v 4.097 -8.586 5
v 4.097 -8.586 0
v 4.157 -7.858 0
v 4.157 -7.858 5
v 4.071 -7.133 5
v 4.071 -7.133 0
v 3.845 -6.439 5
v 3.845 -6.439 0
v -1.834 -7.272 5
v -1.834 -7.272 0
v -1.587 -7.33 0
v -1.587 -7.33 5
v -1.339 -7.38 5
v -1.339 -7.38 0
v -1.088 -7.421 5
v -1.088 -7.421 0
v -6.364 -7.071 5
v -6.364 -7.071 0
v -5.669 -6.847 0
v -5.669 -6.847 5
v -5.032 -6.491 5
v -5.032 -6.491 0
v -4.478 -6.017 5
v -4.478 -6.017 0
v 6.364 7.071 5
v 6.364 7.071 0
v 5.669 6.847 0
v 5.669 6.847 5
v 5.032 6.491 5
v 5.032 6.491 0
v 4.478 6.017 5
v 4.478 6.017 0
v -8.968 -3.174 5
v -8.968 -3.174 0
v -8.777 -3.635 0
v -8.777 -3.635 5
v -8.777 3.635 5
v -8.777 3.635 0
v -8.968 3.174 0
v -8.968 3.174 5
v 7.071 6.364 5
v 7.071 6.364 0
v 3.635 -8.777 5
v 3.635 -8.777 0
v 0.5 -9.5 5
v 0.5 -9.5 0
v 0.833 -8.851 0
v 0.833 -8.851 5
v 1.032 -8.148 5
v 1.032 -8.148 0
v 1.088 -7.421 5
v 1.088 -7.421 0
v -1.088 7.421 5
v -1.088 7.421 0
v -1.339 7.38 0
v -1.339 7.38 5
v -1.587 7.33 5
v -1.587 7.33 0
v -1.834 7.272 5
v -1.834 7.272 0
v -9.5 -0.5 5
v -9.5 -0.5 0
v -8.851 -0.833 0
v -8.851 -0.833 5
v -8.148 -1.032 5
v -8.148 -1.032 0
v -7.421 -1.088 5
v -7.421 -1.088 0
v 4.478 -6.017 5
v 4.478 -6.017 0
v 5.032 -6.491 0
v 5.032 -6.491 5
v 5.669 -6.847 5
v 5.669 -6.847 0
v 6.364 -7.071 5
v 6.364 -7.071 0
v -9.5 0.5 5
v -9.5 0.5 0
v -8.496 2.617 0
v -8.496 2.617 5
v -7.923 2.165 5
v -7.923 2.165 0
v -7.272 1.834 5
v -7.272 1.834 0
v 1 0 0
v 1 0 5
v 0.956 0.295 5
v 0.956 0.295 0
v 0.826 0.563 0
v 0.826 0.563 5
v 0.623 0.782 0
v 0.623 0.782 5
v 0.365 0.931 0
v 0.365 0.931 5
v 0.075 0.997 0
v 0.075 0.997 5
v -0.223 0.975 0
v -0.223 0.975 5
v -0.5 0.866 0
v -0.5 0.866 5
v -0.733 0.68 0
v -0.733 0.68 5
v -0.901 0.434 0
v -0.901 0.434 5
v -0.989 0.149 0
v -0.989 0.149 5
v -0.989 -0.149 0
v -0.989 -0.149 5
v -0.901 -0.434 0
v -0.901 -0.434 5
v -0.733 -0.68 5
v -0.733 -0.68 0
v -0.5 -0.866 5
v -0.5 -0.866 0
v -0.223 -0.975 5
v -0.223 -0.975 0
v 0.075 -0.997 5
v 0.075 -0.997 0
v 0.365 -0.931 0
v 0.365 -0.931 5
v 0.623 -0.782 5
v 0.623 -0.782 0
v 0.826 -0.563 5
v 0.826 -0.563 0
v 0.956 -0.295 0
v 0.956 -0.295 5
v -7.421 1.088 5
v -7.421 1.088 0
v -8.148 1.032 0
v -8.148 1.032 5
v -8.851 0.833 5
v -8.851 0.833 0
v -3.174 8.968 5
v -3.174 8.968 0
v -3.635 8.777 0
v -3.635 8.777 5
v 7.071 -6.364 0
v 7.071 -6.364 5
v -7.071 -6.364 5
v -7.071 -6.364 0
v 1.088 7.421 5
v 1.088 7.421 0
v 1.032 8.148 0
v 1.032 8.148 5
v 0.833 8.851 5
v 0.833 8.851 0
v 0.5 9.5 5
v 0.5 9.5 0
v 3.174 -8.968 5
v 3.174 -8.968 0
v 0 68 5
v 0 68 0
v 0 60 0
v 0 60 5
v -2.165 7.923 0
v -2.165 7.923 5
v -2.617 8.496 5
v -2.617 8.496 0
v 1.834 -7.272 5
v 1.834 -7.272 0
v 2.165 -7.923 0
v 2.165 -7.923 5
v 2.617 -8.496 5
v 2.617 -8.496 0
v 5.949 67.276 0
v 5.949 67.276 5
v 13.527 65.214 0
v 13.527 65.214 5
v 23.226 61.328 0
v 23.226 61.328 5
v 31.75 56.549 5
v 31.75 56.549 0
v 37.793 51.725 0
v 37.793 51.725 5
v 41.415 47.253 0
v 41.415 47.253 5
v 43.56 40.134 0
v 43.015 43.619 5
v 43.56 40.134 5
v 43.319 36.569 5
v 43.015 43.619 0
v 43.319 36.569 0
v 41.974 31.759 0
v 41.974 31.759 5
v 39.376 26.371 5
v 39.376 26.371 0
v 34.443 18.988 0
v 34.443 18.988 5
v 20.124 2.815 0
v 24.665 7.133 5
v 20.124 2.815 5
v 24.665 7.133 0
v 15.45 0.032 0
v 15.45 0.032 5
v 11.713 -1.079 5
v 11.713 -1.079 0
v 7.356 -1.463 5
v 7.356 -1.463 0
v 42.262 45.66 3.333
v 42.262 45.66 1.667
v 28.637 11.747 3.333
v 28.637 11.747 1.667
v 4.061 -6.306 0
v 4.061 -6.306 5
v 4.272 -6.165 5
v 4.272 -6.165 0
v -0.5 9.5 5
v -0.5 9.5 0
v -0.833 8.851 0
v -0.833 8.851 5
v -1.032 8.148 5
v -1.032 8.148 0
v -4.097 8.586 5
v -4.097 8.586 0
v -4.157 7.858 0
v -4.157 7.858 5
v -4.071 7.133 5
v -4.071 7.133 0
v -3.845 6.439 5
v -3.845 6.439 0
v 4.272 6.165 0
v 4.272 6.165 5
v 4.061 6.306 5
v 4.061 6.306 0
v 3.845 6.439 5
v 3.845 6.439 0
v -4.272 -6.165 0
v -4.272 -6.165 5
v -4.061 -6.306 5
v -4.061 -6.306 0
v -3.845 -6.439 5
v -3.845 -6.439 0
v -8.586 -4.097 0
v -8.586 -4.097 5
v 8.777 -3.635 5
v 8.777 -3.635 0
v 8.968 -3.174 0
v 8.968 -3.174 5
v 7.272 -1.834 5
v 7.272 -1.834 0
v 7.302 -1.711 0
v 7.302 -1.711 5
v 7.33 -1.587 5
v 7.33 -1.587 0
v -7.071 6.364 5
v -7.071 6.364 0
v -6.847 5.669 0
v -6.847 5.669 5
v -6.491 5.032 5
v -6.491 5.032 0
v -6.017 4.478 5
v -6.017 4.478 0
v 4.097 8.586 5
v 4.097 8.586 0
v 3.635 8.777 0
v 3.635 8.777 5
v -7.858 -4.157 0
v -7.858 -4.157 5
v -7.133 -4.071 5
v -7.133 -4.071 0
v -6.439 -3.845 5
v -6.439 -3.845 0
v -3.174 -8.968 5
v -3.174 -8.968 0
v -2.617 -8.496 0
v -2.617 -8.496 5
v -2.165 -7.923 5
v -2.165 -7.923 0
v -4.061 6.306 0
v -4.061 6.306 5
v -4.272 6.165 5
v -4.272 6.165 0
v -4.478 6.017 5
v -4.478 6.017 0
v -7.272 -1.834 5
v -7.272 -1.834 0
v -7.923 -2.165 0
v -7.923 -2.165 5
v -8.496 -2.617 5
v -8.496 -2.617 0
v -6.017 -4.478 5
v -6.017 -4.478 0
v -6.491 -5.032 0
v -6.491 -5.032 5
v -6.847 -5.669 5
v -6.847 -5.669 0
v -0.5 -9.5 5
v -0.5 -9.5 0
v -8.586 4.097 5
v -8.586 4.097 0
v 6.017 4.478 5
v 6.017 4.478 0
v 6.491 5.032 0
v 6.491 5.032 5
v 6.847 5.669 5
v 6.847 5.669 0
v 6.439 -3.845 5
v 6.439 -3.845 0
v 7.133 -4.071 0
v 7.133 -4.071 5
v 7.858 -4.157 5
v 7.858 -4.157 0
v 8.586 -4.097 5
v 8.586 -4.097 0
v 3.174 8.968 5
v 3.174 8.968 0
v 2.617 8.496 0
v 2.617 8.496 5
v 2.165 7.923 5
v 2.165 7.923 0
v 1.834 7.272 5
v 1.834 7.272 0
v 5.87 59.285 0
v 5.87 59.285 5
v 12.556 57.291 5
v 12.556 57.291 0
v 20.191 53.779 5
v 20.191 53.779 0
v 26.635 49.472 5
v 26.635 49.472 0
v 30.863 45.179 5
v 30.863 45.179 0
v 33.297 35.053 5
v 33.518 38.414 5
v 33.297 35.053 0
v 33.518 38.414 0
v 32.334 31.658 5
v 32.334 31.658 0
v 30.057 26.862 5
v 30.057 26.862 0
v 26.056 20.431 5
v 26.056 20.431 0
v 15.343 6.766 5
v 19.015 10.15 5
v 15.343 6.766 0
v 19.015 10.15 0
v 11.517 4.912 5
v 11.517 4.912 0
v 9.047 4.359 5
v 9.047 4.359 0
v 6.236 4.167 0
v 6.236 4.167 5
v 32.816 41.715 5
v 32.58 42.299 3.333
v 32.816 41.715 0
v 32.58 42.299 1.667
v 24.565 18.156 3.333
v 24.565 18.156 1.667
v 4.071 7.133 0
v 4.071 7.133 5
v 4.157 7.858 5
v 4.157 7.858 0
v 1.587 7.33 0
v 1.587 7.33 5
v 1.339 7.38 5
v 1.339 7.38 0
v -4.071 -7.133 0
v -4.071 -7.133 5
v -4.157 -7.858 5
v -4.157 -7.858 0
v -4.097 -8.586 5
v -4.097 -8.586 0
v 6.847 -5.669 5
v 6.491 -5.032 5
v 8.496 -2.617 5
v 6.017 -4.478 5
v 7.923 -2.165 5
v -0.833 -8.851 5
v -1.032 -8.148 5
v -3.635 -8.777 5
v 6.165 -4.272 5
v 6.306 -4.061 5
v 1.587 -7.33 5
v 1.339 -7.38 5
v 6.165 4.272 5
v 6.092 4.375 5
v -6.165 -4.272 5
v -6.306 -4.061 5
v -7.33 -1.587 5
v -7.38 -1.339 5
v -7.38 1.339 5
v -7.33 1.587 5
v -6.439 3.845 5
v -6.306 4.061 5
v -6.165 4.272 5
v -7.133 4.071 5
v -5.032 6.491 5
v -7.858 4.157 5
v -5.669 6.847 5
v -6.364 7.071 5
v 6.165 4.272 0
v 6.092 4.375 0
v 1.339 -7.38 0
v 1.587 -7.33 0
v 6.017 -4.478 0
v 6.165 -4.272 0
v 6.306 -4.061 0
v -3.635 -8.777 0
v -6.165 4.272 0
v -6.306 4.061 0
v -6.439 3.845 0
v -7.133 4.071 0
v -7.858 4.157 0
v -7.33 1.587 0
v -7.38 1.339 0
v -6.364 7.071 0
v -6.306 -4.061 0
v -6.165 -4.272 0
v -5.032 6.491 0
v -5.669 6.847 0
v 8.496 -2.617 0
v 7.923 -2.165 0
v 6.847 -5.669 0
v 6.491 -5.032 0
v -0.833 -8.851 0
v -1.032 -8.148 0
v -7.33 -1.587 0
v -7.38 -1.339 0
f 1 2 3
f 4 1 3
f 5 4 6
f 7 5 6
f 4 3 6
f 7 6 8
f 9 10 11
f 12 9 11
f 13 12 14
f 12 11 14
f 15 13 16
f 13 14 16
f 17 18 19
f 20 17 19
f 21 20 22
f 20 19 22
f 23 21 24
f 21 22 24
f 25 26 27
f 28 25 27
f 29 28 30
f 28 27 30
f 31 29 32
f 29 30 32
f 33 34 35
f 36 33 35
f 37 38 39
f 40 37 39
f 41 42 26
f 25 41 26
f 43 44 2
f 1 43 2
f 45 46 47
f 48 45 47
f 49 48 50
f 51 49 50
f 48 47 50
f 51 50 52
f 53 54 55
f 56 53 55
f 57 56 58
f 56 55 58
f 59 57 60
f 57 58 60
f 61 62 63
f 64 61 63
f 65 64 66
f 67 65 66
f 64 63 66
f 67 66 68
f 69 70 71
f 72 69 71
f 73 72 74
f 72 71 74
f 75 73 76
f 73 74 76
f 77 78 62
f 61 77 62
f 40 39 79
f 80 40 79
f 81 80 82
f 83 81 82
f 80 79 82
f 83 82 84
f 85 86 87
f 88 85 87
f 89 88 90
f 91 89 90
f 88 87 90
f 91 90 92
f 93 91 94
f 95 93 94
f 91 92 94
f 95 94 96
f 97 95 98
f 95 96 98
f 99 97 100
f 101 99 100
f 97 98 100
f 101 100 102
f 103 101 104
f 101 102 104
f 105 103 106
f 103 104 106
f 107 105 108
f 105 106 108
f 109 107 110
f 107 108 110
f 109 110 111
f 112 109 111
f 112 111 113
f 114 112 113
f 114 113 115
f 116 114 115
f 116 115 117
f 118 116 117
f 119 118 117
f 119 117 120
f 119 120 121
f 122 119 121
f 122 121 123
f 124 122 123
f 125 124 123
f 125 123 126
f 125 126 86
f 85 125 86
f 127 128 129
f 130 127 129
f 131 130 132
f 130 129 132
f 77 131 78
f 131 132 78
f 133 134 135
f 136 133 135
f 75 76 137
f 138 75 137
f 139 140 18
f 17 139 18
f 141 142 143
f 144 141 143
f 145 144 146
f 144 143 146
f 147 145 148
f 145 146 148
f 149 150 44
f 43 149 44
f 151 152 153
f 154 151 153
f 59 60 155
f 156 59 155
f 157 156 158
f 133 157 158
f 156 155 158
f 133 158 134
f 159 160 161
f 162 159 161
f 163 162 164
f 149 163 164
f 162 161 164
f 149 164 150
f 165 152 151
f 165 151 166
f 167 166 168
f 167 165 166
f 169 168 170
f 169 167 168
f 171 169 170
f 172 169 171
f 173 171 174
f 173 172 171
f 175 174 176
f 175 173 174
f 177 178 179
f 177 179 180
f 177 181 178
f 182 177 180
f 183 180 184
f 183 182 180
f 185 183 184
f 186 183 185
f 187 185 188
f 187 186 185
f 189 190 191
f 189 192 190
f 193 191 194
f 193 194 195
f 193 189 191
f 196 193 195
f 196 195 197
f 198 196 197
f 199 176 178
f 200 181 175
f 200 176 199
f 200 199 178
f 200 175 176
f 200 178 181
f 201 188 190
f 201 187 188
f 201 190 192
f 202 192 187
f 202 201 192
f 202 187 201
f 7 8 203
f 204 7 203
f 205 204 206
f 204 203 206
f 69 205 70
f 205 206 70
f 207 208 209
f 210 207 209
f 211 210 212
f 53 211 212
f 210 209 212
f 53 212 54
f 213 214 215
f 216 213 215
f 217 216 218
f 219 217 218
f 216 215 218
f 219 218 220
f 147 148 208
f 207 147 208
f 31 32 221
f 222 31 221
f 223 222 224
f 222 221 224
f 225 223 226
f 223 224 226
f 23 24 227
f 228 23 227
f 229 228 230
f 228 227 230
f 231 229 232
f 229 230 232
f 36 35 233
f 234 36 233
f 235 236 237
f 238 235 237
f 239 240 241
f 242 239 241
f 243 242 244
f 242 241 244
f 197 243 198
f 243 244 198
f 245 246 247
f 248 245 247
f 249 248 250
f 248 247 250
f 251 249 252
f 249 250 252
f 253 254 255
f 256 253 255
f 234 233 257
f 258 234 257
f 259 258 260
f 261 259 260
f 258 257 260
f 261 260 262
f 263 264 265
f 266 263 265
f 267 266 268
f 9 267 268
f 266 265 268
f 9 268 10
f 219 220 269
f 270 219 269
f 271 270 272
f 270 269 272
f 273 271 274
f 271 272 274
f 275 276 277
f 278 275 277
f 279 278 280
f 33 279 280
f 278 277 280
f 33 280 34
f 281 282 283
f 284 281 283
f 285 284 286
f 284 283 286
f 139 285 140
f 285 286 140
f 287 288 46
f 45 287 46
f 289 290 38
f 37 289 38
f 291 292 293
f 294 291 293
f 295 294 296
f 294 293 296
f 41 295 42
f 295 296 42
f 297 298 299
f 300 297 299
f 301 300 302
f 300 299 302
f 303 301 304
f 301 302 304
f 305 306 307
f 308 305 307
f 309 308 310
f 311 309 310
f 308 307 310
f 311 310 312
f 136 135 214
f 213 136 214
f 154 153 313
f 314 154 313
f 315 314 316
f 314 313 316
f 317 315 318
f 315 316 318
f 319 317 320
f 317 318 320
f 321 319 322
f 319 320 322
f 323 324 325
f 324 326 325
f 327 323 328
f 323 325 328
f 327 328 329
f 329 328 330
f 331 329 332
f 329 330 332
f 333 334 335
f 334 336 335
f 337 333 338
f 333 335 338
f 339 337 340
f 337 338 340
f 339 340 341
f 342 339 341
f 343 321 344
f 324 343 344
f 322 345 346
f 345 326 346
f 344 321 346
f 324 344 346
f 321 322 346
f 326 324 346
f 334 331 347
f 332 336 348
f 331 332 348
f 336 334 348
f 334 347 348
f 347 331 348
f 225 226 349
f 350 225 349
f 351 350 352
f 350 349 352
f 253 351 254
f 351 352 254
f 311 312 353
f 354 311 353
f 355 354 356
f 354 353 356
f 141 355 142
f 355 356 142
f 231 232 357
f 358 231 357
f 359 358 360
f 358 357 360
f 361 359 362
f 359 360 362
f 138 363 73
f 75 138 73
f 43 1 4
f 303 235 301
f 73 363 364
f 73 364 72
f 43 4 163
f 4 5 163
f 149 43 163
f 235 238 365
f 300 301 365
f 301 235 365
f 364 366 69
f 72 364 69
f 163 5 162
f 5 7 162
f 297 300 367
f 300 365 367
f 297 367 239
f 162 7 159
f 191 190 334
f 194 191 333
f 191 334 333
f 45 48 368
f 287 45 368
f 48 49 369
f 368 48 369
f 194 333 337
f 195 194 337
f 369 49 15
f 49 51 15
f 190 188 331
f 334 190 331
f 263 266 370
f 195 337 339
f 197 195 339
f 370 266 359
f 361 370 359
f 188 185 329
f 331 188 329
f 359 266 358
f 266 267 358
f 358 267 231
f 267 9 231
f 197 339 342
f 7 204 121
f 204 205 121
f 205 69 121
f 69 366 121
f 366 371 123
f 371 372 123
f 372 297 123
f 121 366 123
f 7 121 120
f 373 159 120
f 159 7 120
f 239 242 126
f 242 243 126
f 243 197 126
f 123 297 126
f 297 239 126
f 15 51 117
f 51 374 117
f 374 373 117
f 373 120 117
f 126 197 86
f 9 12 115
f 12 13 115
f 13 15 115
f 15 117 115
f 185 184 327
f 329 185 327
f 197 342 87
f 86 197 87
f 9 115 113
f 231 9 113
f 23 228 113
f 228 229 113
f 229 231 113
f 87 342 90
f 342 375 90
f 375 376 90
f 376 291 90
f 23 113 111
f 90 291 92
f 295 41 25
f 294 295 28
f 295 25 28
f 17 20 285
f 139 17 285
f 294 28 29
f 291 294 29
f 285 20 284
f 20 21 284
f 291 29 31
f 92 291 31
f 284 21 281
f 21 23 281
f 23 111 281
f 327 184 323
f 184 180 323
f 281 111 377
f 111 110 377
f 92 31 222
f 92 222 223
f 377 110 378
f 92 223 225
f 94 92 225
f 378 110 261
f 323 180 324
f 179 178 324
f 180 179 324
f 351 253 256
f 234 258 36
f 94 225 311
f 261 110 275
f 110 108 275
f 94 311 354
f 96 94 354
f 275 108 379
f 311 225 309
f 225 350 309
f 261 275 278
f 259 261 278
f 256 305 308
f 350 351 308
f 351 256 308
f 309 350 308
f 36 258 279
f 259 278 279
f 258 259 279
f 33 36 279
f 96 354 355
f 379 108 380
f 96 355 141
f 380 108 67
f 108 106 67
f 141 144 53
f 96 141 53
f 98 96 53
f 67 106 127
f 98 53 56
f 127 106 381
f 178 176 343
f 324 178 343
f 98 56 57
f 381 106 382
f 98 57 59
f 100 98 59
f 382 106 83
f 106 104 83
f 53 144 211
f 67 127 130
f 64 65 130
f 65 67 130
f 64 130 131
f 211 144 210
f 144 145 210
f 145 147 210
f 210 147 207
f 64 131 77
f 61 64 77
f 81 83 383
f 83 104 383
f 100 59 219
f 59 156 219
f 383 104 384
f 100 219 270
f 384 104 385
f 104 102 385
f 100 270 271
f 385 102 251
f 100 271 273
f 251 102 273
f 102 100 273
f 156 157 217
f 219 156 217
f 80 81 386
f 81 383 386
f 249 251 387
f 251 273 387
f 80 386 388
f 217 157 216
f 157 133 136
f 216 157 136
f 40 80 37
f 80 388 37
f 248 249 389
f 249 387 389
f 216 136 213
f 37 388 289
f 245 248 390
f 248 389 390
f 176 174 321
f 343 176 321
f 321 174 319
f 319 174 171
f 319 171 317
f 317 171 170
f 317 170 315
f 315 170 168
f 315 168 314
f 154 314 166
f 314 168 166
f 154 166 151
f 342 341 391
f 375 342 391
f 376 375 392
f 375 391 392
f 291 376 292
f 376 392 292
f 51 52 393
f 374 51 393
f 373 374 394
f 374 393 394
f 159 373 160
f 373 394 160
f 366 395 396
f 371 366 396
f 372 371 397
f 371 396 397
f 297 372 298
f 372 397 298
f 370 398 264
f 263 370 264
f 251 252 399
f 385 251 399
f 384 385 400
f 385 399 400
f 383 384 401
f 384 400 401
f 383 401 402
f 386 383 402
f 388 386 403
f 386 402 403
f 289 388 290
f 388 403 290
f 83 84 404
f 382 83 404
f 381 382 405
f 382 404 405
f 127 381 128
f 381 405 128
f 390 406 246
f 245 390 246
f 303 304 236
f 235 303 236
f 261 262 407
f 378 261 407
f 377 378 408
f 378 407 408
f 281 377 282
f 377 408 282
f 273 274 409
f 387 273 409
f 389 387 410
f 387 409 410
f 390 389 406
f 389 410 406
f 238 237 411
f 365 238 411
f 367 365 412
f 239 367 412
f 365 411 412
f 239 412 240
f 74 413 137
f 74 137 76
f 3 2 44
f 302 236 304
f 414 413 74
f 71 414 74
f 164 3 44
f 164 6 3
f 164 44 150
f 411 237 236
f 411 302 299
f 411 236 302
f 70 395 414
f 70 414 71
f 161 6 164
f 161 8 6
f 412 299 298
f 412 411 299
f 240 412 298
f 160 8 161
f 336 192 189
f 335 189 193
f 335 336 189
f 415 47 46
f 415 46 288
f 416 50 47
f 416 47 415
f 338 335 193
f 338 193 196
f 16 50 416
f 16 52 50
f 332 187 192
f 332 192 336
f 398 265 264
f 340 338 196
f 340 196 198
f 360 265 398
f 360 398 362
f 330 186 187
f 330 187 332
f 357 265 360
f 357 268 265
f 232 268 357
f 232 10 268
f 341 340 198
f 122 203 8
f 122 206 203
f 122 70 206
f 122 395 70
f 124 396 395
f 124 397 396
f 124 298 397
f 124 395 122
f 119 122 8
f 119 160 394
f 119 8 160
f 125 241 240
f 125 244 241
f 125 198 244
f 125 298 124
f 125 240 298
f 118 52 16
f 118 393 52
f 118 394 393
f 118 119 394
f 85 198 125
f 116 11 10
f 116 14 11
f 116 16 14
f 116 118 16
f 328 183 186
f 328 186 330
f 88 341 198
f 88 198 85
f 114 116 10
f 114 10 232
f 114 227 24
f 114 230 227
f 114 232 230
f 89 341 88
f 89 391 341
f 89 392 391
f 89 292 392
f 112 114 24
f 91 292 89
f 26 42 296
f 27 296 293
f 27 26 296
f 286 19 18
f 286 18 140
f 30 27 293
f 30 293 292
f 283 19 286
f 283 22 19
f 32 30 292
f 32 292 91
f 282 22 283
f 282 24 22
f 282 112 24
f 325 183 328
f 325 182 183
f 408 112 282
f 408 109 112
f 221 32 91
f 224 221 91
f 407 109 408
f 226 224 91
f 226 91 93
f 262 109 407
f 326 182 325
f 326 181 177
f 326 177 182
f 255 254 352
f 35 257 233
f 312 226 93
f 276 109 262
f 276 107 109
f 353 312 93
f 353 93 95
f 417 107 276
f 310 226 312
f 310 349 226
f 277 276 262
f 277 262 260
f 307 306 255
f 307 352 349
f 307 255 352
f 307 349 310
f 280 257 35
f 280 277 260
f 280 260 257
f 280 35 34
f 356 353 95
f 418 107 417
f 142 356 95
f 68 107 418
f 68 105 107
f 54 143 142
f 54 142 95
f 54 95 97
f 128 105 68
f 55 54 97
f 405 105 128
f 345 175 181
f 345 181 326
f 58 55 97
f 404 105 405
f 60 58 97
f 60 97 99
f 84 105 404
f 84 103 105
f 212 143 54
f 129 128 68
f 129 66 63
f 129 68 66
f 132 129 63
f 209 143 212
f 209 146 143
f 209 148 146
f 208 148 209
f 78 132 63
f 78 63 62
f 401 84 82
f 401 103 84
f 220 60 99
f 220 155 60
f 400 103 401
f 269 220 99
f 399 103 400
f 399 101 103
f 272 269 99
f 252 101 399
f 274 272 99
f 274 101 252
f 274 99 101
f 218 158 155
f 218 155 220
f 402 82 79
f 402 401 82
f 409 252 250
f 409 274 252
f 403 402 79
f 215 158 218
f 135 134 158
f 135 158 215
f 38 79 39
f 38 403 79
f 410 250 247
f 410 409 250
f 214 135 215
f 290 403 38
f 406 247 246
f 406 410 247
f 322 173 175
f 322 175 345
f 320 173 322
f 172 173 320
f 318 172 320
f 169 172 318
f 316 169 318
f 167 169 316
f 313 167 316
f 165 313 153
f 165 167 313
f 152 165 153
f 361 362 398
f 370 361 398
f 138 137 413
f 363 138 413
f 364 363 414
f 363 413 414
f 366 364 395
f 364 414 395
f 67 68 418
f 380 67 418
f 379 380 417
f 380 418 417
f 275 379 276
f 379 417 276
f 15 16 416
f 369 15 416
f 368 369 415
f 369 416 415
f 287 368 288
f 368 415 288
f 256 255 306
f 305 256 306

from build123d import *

# Parameters (mm, degrees)
F1_DEPTH = 5
F2_R     = 1
F3_DEPTH = 5.001
F5_DEPTH = 5


with BuildPart() as f1:
    # F0 (on Top) → F1 (new body)
    with BuildSketch(Plane.XY):
        with BuildLine():
            ThreePointArc((7.4206173165, -1.0883191822), (7.4801280027, -0.5456052265), (7.5, 0))
            ThreePointArc((7.5, 0), (7.4801280027, 0.5456052265), (7.4206173165, 1.0883191822))
            ThreePointArc((7.4206173165, 1.0883191822), (7.355889603, 1.4631774151), (7.2722381774, 1.8342714877))
            ThreePointArc((7.2722381774, 1.8342714877), (6.9290964938, 2.8701257427), (6.4392747372, 3.8452231222))
            ThreePointArc((6.4392747372, 3.8452231222), (6.2360220923, 4.1667767476), (6.0167266989, 4.4776109513))
            ThreePointArc((6.0167266989, 4.4776109513), (5.3033008589, 5.3033008589), (4.4776109513, 6.0167266989))
            ThreePointArc((4.4776109513, 6.0167266989), (4.1667767476, 6.2360220923), (3.8452231222, 6.4392747372))
            ThreePointArc((3.8452231222, 6.4392747372), (2.8701257427, 6.9290964938), (1.8342714877, 7.2722381774))
            ThreePointArc((1.8342714877, 7.2722381774), (1.4631774151, 7.355889603), (1.0883191822, 7.4206173165))
            ThreePointArc((1.0883191822, 7.4206173165), (0, 7.5), (-1.0883191822, 7.4206173165))
            ThreePointArc((-1.0883191822, 7.4206173165), (-1.4631774151, 7.355889603), (-1.8342714877, 7.2722381774))
            ThreePointArc((-1.8342714877, 7.2722381774), (-2.8701257427, 6.9290964938), (-3.8452231222, 6.4392747372))
            ThreePointArc((-3.8452231222, 6.4392747372), (-4.1667767476, 6.2360220923), (-4.4776109513, 6.0167266989))
            ThreePointArc((-4.4776109513, 6.0167266989), (-5.3033008589, 5.3033008589), (-6.0167266989, 4.4776109513))
            ThreePointArc((-6.0167266989, 4.4776109513), (-6.2360220923, 4.1667767476), (-6.4392747372, 3.8452231222))
            ThreePointArc((-6.4392747372, 3.8452231222), (-6.9290964938, 2.8701257427), (-7.2722381774, 1.8342714877))
            ThreePointArc((-7.2722381774, 1.8342714877), (-7.355889603, 1.4631774151), (-7.4206173165, 1.0883191822))
            ThreePointArc((-7.4206173165, 1.0883191822), (-7.5, 0), (-7.4206173165, -1.0883191822))
            ThreePointArc((-7.4206173165, -1.0883191822), (-7.355889603, -1.4631774151), (-7.2722381774, -1.8342714877))
            ThreePointArc((-7.2722381774, -1.8342714877), (-6.9290964938, -2.8701257427), (-6.4392747372, -3.8452231222))
            ThreePointArc((-6.4392747372, -3.8452231222), (-6.2360220923, -4.1667767476), (-6.0167266989, -4.4776109513))
            ThreePointArc((-6.0167266989, -4.4776109513), (-5.3033008589, -5.3033008589), (-4.4776109513, -6.0167266989))
            ThreePointArc((-4.4776109513, -6.0167266989), (-4.1667767476, -6.2360220923), (-3.8452231222, -6.4392747372))
            ThreePointArc((-3.8452231222, -6.4392747372), (-2.8701257427, -6.9290964938), (-1.8342714877, -7.2722381774))
            ThreePointArc((-1.8342714877, -7.2722381774), (-1.4631774151, -7.355889603), (-1.0883191822, -7.4206173165))
            ThreePointArc((-1.0883191822, -7.4206173165), (0, -7.5), (1.0883191822, -7.4206173165))
            ThreePointArc((1.0883191822, -7.4206173165), (1.4631774151, -7.355889603), (1.8342714877, -7.2722381774))
            ThreePointArc((1.8342714877, -7.2722381774), (2.8701257427, -6.9290964938), (3.8452231222, -6.4392747372))
            ThreePointArc((3.8452231222, -6.4392747372), (4.1667767476, -6.2360220923), (4.4776109513, -6.0167266989))
            ThreePointArc((4.4776109513, -6.0167266989), (5.3033008589, -5.3033008589), (6.0167266989, -4.4776109513))
            ThreePointArc((6.0167266989, -4.4776109513), (6.2360220923, -4.1667767476), (6.4392747372, -3.8452231222))
            ThreePointArc((6.4392747372, -3.8452231222), (6.9290964938, -2.8701257427), (7.2722381774, -1.8342714877))
            ThreePointArc((7.2722381774, -1.8342714877), (7.355889603, -1.4631774151), (7.4206173165, -1.0883191822))
        make_face()
        with BuildLine():
            ThreePointArc((7.4206173165, 1.0883191822), (7.4801280027, 0.5456052265), (7.5, 0))
            ThreePointArc((7.5, 0), (7.4801280027, -0.5456052265), (7.4206173165, -1.0883191822))
            ThreePointArc((7.4206173165, -1.0883191822), (8.5043518229, -0.9498278009), (9.5, -0.5))
            Line((9.5, -0.5), (9.5, 0))
            Line((9.5, 0), (9.5, 0.5))
            ThreePointArc((9.5, 0.5), (8.5043518229, 0.9498278009), (7.4206173165, 1.0883191822))
        make_face()
        with BuildLine():
            ThreePointArc((6.4392747372, 3.8452231222), (6.9290964938, 2.8701257427), (7.2722381774, 1.8342714877))
            ThreePointArc((7.2722381774, 1.8342714877), (8.2204799494, 2.376948081), (8.968197275, 3.1735528412))
            Line((8.968197275, 3.1735528412), (8.7768555589, 3.6354926075))
            Line((8.7768555589, 3.6354926075), (8.5855138427, 4.0974323737))
            ThreePointArc((8.5855138427, 4.0974323737), (7.4935132234, 4.1320010103), (6.4392747372, 3.8452231222))
        make_face()
        with BuildLine():
            ThreePointArc((8.968197275, -3.1735528412), (8.2204799494, -2.376948081), (7.2722381774, -1.8342714877))
            ThreePointArc((7.2722381774, -1.8342714877), (6.9290964938, -2.8701257427), (6.4392747372, -3.8452231222))
            ThreePointArc((6.4392747372, -3.8452231222), (7.4935132234, -4.1320010103), (8.5855138427, -4.0974323737))
            Line((8.5855138427, -4.0974323737), (8.7768555589, -3.6354926075))
            Line((8.7768555589, -3.6354926075), (8.968197275, -3.1735528412))
        make_face()
        with BuildLine():
            ThreePointArc((4.4776109513, 6.0167266989), (5.3033008589, 5.3033008589), (6.0167266989, 4.4776109513))
            ThreePointArc((6.0167266989, 4.4776109513), (6.6851145225, 5.3418551646), (7.0710678119, 6.3639610307))
            Line((7.0710678119, 6.3639610307), (6.7175144213, 6.7175144213))
            Line((6.7175144213, 6.7175144213), (6.3639610307, 7.0710678119))
            ThreePointArc((6.3639610307, 7.0710678119), (5.3418551646, 6.6851145225), (4.4776109513, 6.0167266989))
        make_face()
        with BuildLine():
            ThreePointArc((7.0710678119, -6.3639610307), (6.6851145225, -5.3418551646), (6.0167266989, -4.4776109513))
            ThreePointArc((6.0167266989, -4.4776109513), (5.3033008589, -5.3033008589), (4.4776109513, -6.0167266989))
            ThreePointArc((4.4776109513, -6.0167266989), (5.3418551646, -6.6851145225), (6.3639610307, -7.0710678119))
            Line((6.3639610307, -7.0710678119), (6.7175144213, -6.7175144213))
            Line((6.7175144213, -6.7175144213), (7.0710678119, -6.3639610307))
        make_face()
        with BuildLine():
            ThreePointArc((1.8342714877, 7.2722381774), (2.8701257427, 6.9290964938), (3.8452231222, 6.4392747372))
            ThreePointArc((3.8452231222, 6.4392747372), (4.1320010103, 7.4935132234), (4.0974323737, 8.5855138427))
            Line((4.0974323737, 8.5855138427), (3.6354926075, 8.7768555589))
            Line((3.6354926075, 8.7768555589), (3.1735528412, 8.968197275))
            ThreePointArc((3.1735528412, 8.968197275), (2.376948081, 8.2204799494), (1.8342714877, 7.2722381774))
        make_face()
        with BuildLine():
            ThreePointArc((4.0974323737, -8.5855138427), (4.1320010103, -7.4935132234), (3.8452231222, -6.4392747372))
            ThreePointArc((3.8452231222, -6.4392747372), (2.8701257427, -6.9290964938), (1.8342714877, -7.2722381774))
            ThreePointArc((1.8342714877, -7.2722381774), (2.376948081, -8.2204799494), (3.1735528412, -8.968197275))
            Line((3.1735528412, -8.968197275), (3.6354926075, -8.7768555589))
            Line((3.6354926075, -8.7768555589), (4.0974323737, -8.5855138427))
        make_face()
        with BuildLine():
            ThreePointArc((-1.0883191822, 7.4206173165), (0, 7.5), (1.0883191822, 7.4206173165))
            ThreePointArc((1.0883191822, 7.4206173165), (0.9498278009, 8.5043518229), (0.5, 9.5))
            Line((0.5, 9.5), (0, 9.5))
            Line((0, 9.5), (-0.5, 9.5))
            ThreePointArc((-0.5, 9.5), (-0.9498278009, 8.5043518229), (-1.0883191822, 7.4206173165))
        make_face()
        with BuildLine():
            ThreePointArc((0.5, -9.5), (0.9498278009, -8.5043518229), (1.0883191822, -7.4206173165))
            ThreePointArc((1.0883191822, -7.4206173165), (0, -7.5), (-1.0883191822, -7.4206173165))
            ThreePointArc((-1.0883191822, -7.4206173165), (-0.9498278009, -8.5043518229), (-0.5, -9.5))
            Line((-0.5, -9.5), (0, -9.5))
            Line((0, -9.5), (0.5, -9.5))
        make_face()
        with BuildLine():
            ThreePointArc((-3.8452231222, 6.4392747372), (-2.8701257427, 6.9290964938), (-1.8342714877, 7.2722381774))
            ThreePointArc((-1.8342714877, 7.2722381774), (-2.376948081, 8.2204799494), (-3.1735528412, 8.968197275))
            Line((-3.1735528412, 8.968197275), (-3.6354926075, 8.7768555589))
            Line((-3.6354926075, 8.7768555589), (-4.0974323737, 8.5855138427))
            ThreePointArc((-4.0974323737, 8.5855138427), (-4.1320010103, 7.4935132234), (-3.8452231222, 6.4392747372))
        make_face()
        with BuildLine():
            ThreePointArc((-3.1735528412, -8.968197275), (-2.376948081, -8.2204799494), (-1.8342714877, -7.2722381774))
            ThreePointArc((-1.8342714877, -7.2722381774), (-2.8701257427, -6.9290964938), (-3.8452231222, -6.4392747372))
            ThreePointArc((-3.8452231222, -6.4392747372), (-4.1320010103, -7.4935132234), (-4.0974323737, -8.5855138427))
            Line((-4.0974323737, -8.5855138427), (-3.6354926075, -8.7768555589))
            Line((-3.6354926075, -8.7768555589), (-3.1735528412, -8.968197275))
        make_face()
        with BuildLine():
            ThreePointArc((-6.0167266989, 4.4776109513), (-5.3033008589, 5.3033008589), (-4.4776109513, 6.0167266989))
            ThreePointArc((-4.4776109513, 6.0167266989), (-5.3418551646, 6.6851145225), (-6.3639610307, 7.0710678119))
            Line((-6.3639610307, 7.0710678119), (-6.7175144213, 6.7175144213))
            Line((-6.7175144213, 6.7175144213), (-7.0710678119, 6.3639610307))
            ThreePointArc((-7.0710678119, 6.3639610307), (-6.6851145225, 5.3418551646), (-6.0167266989, 4.4776109513))
        make_face()
        with BuildLine():
            ThreePointArc((-6.3639610307, -7.0710678119), (-5.3418551646, -6.6851145225), (-4.4776109513, -6.0167266989))
            ThreePointArc((-4.4776109513, -6.0167266989), (-5.3033008589, -5.3033008589), (-6.0167266989, -4.4776109513))
            ThreePointArc((-6.0167266989, -4.4776109513), (-6.6851145225, -5.3418551646), (-7.0710678119, -6.3639610307))
            Line((-7.0710678119, -6.3639610307), (-6.7175144213, -6.7175144213))
            Line((-6.7175144213, -6.7175144213), (-6.3639610307, -7.0710678119))
        make_face()
        with BuildLine():
            ThreePointArc((-7.2722381774, 1.8342714877), (-6.9290964938, 2.8701257427), (-6.4392747372, 3.8452231222))
            ThreePointArc((-6.4392747372, 3.8452231222), (-7.4935132234, 4.1320010103), (-8.5855138427, 4.0974323737))
            Line((-8.5855138427, 4.0974323737), (-8.7768555589, 3.6354926075))
            Line((-8.7768555589, 3.6354926075), (-8.968197275, 3.1735528412))
            ThreePointArc((-8.968197275, 3.1735528412), (-8.2204799494, 2.376948081), (-7.2722381774, 1.8342714877))
        make_face()
        with BuildLine():
            ThreePointArc((-8.5855138427, -4.0974323737), (-7.4935132234, -4.1320010103), (-6.4392747372, -3.8452231222))
            ThreePointArc((-6.4392747372, -3.8452231222), (-6.9290964938, -2.8701257427), (-7.2722381774, -1.8342714877))
            ThreePointArc((-7.2722381774, -1.8342714877), (-8.2204799494, -2.376948081), (-8.968197275, -3.1735528412))
            Line((-8.968197275, -3.1735528412), (-8.7768555589, -3.6354926075))
            Line((-8.7768555589, -3.6354926075), (-8.5855138427, -4.0974323737))
        make_face()
        with BuildLine():
            ThreePointArc((-7.4206173165, -1.0883191822), (-7.5, 0), (-7.4206173165, 1.0883191822))
            ThreePointArc((-7.4206173165, 1.0883191822), (-8.5043518229, 0.9498278009), (-9.5, 0.5))
            Line((-9.5, 0.5), (-9.5, 0))
            Line((-9.5, 0), (-9.5, -0.5))
            ThreePointArc((-9.5, -0.5), (-8.5043518229, -0.9498278009), (-7.4206173165, -1.0883191822))
        make_face()
    extrude(amount=F1_DEPTH)

    # F2 (on face) → F3 (cut, through all)
    with BuildSketch(Plane.XY.offset(5)):
        Circle(F2_R)
    extrude(amount=-F3_DEPTH, mode=Mode.SUBTRACT)

    # F4 (on Top) → F5 (join, through all)
    with BuildSketch(Plane.XY):
        with BuildLine():
            add(Edge.make_bspline(
                [(0, 68), (10, 68), (59.6051205552, 49.8296945221), (27.7128449588, 10.2653439141), (17.355889603, -1.4631774151), (7.355889603, -1.4631774151)],
                knots=[0, 0, 0, 0, 0.3848753966, 0.721401085, 1, 1, 1, 1], degree=3))
            Line((0, 68), (0, 60))
            add(Edge.make_bspline(
                [(0, 60), (10, 60), (43.7330109068, 44.8640909955), (23.495328063, 17.7260923975), (16.2360220923, 4.1667767476), (6.2360220923, 4.1667767476)],
                knots=[0, 0, 0, 0, 0.3821350883, 0.6986543171, 1, 1, 1, 1], degree=3))
            Line((6.2360220923, 4.1667767476), (7.355889603, -1.4631774151))
        make_face()
    extrude(amount=F5_DEPTH)


solid = f1.part
